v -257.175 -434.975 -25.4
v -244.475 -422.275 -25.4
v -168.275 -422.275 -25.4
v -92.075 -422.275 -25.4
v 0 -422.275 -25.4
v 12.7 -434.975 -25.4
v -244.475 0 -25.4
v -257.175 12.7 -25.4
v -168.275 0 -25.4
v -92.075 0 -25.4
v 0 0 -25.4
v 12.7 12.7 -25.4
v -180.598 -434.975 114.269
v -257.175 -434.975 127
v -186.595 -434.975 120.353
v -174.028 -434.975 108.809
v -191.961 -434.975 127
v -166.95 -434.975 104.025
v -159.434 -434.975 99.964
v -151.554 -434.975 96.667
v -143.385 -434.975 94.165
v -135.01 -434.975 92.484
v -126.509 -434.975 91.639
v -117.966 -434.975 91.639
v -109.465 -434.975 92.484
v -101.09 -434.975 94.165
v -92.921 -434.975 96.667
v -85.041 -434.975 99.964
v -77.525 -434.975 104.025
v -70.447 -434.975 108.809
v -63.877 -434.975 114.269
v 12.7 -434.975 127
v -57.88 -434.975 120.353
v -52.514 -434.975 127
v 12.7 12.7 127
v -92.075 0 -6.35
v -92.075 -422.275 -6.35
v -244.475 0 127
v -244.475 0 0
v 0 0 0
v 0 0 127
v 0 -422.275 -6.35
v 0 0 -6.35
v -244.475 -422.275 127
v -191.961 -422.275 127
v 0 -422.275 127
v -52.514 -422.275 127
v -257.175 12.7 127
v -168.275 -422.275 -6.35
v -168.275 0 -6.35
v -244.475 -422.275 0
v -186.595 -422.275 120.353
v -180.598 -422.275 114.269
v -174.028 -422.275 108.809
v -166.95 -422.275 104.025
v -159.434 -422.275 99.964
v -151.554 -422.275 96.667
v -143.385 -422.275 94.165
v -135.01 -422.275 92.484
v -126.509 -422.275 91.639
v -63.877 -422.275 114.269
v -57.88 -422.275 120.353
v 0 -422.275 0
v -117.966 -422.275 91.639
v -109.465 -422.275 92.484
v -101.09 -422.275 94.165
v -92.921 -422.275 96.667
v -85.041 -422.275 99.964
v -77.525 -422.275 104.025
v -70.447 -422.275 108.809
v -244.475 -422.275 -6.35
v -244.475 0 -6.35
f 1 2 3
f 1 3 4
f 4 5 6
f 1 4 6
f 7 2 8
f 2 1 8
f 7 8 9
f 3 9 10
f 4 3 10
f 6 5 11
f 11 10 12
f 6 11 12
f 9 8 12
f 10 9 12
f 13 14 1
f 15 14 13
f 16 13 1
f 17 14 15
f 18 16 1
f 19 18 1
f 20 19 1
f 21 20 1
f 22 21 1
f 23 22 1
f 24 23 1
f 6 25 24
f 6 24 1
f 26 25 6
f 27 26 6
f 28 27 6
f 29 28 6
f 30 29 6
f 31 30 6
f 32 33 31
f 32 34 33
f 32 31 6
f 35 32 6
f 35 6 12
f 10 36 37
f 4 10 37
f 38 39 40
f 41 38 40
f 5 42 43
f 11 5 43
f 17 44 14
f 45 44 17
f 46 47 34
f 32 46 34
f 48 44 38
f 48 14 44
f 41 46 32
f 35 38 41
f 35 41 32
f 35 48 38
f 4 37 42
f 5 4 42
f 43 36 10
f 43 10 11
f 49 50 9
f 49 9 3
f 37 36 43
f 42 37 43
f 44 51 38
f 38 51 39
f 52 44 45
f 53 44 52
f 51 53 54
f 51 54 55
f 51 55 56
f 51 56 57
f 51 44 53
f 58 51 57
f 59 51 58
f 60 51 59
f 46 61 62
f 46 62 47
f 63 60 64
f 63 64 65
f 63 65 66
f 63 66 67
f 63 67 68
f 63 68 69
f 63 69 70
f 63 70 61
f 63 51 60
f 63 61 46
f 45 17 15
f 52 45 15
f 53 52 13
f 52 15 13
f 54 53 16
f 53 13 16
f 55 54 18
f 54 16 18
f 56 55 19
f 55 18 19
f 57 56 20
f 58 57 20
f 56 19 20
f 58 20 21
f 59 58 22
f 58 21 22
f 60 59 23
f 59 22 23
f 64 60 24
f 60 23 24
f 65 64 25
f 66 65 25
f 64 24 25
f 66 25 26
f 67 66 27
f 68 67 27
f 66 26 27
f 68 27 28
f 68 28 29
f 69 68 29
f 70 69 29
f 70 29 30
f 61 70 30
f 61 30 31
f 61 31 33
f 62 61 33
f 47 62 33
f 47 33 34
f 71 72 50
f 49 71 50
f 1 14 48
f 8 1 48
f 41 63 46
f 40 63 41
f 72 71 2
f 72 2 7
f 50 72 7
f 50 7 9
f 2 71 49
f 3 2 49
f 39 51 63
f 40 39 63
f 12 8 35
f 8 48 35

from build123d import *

# Parameters (mm, degrees)
F0_W          = 244.475
F0_H          = 422.275
F1_DEPTH      = 6.35
F0_W_2        = 269.875
F0_H_2        = 447.675
F2_DEPTH      = 127
F2_DEPTH_BACK = 25.4
F3_W          = 76.2
F3_H          = 422.275
F4_DEPTH      = 19.05
F6_DEPTH      = 25.4


with BuildPart() as f1:
    # F0 (on Top) → F1 (new body)
    with BuildSketch(Plane.XY):
        with Locations((-122.2375, -211.1375)):
            Rectangle(F0_W, F0_H)
    extrude(amount=-F1_DEPTH)

    # F0 (on Top) → F2 (join, two sides)
    with BuildSketch(Plane.XY) as f2_sk:
        with Locations((-122.2375, -211.1375)):
            Rectangle(F0_W_2, F0_H_2)
        with Locations((-122.2375, -211.1375)):
            Rectangle(F0_W, F0_H, mode=Mode.SUBTRACT)
    extrude(amount=F2_DEPTH)
    extrude(f2_sk.sketch, amount=-F2_DEPTH_BACK)

    # F3 (on face) → F4 (join, through all)
    with BuildSketch(Plane(origin=(0, 0, -6.35), x_dir=(1, 0, 0), z_dir=(0, 0, -1))):
        with Locations((-130.175, 211.1375)):
            Rectangle(F3_W, F3_H)
    extrude(amount=F4_DEPTH)

    # F5 (on face) → F6 (cut)
    with BuildSketch(Plane.XZ.offset(434.975)):
        with BuildLine():
            Line((-38.1, 158.75), (-206.375, 158.75))
            ThreePointArc((-206.375, 158.75), (-200.788921, 142.139157), (-191.961107, 127))
            Line((-191.961107, 127), (-52.513893, 127))
            ThreePointArc((-52.513893, 127), (-43.686079, 142.139157), (-38.1, 158.75))
        make_face()
        with BuildLine():
            Line((-52.513893, 127), (-191.961107, 127))
            ThreePointArc((-191.961107, 127), (-122.2375, 91.532849), (-52.513893, 127))
        make_face()
    extrude(amount=-F6_DEPTH, mode=Mode.SUBTRACT)


solid = f1.part
